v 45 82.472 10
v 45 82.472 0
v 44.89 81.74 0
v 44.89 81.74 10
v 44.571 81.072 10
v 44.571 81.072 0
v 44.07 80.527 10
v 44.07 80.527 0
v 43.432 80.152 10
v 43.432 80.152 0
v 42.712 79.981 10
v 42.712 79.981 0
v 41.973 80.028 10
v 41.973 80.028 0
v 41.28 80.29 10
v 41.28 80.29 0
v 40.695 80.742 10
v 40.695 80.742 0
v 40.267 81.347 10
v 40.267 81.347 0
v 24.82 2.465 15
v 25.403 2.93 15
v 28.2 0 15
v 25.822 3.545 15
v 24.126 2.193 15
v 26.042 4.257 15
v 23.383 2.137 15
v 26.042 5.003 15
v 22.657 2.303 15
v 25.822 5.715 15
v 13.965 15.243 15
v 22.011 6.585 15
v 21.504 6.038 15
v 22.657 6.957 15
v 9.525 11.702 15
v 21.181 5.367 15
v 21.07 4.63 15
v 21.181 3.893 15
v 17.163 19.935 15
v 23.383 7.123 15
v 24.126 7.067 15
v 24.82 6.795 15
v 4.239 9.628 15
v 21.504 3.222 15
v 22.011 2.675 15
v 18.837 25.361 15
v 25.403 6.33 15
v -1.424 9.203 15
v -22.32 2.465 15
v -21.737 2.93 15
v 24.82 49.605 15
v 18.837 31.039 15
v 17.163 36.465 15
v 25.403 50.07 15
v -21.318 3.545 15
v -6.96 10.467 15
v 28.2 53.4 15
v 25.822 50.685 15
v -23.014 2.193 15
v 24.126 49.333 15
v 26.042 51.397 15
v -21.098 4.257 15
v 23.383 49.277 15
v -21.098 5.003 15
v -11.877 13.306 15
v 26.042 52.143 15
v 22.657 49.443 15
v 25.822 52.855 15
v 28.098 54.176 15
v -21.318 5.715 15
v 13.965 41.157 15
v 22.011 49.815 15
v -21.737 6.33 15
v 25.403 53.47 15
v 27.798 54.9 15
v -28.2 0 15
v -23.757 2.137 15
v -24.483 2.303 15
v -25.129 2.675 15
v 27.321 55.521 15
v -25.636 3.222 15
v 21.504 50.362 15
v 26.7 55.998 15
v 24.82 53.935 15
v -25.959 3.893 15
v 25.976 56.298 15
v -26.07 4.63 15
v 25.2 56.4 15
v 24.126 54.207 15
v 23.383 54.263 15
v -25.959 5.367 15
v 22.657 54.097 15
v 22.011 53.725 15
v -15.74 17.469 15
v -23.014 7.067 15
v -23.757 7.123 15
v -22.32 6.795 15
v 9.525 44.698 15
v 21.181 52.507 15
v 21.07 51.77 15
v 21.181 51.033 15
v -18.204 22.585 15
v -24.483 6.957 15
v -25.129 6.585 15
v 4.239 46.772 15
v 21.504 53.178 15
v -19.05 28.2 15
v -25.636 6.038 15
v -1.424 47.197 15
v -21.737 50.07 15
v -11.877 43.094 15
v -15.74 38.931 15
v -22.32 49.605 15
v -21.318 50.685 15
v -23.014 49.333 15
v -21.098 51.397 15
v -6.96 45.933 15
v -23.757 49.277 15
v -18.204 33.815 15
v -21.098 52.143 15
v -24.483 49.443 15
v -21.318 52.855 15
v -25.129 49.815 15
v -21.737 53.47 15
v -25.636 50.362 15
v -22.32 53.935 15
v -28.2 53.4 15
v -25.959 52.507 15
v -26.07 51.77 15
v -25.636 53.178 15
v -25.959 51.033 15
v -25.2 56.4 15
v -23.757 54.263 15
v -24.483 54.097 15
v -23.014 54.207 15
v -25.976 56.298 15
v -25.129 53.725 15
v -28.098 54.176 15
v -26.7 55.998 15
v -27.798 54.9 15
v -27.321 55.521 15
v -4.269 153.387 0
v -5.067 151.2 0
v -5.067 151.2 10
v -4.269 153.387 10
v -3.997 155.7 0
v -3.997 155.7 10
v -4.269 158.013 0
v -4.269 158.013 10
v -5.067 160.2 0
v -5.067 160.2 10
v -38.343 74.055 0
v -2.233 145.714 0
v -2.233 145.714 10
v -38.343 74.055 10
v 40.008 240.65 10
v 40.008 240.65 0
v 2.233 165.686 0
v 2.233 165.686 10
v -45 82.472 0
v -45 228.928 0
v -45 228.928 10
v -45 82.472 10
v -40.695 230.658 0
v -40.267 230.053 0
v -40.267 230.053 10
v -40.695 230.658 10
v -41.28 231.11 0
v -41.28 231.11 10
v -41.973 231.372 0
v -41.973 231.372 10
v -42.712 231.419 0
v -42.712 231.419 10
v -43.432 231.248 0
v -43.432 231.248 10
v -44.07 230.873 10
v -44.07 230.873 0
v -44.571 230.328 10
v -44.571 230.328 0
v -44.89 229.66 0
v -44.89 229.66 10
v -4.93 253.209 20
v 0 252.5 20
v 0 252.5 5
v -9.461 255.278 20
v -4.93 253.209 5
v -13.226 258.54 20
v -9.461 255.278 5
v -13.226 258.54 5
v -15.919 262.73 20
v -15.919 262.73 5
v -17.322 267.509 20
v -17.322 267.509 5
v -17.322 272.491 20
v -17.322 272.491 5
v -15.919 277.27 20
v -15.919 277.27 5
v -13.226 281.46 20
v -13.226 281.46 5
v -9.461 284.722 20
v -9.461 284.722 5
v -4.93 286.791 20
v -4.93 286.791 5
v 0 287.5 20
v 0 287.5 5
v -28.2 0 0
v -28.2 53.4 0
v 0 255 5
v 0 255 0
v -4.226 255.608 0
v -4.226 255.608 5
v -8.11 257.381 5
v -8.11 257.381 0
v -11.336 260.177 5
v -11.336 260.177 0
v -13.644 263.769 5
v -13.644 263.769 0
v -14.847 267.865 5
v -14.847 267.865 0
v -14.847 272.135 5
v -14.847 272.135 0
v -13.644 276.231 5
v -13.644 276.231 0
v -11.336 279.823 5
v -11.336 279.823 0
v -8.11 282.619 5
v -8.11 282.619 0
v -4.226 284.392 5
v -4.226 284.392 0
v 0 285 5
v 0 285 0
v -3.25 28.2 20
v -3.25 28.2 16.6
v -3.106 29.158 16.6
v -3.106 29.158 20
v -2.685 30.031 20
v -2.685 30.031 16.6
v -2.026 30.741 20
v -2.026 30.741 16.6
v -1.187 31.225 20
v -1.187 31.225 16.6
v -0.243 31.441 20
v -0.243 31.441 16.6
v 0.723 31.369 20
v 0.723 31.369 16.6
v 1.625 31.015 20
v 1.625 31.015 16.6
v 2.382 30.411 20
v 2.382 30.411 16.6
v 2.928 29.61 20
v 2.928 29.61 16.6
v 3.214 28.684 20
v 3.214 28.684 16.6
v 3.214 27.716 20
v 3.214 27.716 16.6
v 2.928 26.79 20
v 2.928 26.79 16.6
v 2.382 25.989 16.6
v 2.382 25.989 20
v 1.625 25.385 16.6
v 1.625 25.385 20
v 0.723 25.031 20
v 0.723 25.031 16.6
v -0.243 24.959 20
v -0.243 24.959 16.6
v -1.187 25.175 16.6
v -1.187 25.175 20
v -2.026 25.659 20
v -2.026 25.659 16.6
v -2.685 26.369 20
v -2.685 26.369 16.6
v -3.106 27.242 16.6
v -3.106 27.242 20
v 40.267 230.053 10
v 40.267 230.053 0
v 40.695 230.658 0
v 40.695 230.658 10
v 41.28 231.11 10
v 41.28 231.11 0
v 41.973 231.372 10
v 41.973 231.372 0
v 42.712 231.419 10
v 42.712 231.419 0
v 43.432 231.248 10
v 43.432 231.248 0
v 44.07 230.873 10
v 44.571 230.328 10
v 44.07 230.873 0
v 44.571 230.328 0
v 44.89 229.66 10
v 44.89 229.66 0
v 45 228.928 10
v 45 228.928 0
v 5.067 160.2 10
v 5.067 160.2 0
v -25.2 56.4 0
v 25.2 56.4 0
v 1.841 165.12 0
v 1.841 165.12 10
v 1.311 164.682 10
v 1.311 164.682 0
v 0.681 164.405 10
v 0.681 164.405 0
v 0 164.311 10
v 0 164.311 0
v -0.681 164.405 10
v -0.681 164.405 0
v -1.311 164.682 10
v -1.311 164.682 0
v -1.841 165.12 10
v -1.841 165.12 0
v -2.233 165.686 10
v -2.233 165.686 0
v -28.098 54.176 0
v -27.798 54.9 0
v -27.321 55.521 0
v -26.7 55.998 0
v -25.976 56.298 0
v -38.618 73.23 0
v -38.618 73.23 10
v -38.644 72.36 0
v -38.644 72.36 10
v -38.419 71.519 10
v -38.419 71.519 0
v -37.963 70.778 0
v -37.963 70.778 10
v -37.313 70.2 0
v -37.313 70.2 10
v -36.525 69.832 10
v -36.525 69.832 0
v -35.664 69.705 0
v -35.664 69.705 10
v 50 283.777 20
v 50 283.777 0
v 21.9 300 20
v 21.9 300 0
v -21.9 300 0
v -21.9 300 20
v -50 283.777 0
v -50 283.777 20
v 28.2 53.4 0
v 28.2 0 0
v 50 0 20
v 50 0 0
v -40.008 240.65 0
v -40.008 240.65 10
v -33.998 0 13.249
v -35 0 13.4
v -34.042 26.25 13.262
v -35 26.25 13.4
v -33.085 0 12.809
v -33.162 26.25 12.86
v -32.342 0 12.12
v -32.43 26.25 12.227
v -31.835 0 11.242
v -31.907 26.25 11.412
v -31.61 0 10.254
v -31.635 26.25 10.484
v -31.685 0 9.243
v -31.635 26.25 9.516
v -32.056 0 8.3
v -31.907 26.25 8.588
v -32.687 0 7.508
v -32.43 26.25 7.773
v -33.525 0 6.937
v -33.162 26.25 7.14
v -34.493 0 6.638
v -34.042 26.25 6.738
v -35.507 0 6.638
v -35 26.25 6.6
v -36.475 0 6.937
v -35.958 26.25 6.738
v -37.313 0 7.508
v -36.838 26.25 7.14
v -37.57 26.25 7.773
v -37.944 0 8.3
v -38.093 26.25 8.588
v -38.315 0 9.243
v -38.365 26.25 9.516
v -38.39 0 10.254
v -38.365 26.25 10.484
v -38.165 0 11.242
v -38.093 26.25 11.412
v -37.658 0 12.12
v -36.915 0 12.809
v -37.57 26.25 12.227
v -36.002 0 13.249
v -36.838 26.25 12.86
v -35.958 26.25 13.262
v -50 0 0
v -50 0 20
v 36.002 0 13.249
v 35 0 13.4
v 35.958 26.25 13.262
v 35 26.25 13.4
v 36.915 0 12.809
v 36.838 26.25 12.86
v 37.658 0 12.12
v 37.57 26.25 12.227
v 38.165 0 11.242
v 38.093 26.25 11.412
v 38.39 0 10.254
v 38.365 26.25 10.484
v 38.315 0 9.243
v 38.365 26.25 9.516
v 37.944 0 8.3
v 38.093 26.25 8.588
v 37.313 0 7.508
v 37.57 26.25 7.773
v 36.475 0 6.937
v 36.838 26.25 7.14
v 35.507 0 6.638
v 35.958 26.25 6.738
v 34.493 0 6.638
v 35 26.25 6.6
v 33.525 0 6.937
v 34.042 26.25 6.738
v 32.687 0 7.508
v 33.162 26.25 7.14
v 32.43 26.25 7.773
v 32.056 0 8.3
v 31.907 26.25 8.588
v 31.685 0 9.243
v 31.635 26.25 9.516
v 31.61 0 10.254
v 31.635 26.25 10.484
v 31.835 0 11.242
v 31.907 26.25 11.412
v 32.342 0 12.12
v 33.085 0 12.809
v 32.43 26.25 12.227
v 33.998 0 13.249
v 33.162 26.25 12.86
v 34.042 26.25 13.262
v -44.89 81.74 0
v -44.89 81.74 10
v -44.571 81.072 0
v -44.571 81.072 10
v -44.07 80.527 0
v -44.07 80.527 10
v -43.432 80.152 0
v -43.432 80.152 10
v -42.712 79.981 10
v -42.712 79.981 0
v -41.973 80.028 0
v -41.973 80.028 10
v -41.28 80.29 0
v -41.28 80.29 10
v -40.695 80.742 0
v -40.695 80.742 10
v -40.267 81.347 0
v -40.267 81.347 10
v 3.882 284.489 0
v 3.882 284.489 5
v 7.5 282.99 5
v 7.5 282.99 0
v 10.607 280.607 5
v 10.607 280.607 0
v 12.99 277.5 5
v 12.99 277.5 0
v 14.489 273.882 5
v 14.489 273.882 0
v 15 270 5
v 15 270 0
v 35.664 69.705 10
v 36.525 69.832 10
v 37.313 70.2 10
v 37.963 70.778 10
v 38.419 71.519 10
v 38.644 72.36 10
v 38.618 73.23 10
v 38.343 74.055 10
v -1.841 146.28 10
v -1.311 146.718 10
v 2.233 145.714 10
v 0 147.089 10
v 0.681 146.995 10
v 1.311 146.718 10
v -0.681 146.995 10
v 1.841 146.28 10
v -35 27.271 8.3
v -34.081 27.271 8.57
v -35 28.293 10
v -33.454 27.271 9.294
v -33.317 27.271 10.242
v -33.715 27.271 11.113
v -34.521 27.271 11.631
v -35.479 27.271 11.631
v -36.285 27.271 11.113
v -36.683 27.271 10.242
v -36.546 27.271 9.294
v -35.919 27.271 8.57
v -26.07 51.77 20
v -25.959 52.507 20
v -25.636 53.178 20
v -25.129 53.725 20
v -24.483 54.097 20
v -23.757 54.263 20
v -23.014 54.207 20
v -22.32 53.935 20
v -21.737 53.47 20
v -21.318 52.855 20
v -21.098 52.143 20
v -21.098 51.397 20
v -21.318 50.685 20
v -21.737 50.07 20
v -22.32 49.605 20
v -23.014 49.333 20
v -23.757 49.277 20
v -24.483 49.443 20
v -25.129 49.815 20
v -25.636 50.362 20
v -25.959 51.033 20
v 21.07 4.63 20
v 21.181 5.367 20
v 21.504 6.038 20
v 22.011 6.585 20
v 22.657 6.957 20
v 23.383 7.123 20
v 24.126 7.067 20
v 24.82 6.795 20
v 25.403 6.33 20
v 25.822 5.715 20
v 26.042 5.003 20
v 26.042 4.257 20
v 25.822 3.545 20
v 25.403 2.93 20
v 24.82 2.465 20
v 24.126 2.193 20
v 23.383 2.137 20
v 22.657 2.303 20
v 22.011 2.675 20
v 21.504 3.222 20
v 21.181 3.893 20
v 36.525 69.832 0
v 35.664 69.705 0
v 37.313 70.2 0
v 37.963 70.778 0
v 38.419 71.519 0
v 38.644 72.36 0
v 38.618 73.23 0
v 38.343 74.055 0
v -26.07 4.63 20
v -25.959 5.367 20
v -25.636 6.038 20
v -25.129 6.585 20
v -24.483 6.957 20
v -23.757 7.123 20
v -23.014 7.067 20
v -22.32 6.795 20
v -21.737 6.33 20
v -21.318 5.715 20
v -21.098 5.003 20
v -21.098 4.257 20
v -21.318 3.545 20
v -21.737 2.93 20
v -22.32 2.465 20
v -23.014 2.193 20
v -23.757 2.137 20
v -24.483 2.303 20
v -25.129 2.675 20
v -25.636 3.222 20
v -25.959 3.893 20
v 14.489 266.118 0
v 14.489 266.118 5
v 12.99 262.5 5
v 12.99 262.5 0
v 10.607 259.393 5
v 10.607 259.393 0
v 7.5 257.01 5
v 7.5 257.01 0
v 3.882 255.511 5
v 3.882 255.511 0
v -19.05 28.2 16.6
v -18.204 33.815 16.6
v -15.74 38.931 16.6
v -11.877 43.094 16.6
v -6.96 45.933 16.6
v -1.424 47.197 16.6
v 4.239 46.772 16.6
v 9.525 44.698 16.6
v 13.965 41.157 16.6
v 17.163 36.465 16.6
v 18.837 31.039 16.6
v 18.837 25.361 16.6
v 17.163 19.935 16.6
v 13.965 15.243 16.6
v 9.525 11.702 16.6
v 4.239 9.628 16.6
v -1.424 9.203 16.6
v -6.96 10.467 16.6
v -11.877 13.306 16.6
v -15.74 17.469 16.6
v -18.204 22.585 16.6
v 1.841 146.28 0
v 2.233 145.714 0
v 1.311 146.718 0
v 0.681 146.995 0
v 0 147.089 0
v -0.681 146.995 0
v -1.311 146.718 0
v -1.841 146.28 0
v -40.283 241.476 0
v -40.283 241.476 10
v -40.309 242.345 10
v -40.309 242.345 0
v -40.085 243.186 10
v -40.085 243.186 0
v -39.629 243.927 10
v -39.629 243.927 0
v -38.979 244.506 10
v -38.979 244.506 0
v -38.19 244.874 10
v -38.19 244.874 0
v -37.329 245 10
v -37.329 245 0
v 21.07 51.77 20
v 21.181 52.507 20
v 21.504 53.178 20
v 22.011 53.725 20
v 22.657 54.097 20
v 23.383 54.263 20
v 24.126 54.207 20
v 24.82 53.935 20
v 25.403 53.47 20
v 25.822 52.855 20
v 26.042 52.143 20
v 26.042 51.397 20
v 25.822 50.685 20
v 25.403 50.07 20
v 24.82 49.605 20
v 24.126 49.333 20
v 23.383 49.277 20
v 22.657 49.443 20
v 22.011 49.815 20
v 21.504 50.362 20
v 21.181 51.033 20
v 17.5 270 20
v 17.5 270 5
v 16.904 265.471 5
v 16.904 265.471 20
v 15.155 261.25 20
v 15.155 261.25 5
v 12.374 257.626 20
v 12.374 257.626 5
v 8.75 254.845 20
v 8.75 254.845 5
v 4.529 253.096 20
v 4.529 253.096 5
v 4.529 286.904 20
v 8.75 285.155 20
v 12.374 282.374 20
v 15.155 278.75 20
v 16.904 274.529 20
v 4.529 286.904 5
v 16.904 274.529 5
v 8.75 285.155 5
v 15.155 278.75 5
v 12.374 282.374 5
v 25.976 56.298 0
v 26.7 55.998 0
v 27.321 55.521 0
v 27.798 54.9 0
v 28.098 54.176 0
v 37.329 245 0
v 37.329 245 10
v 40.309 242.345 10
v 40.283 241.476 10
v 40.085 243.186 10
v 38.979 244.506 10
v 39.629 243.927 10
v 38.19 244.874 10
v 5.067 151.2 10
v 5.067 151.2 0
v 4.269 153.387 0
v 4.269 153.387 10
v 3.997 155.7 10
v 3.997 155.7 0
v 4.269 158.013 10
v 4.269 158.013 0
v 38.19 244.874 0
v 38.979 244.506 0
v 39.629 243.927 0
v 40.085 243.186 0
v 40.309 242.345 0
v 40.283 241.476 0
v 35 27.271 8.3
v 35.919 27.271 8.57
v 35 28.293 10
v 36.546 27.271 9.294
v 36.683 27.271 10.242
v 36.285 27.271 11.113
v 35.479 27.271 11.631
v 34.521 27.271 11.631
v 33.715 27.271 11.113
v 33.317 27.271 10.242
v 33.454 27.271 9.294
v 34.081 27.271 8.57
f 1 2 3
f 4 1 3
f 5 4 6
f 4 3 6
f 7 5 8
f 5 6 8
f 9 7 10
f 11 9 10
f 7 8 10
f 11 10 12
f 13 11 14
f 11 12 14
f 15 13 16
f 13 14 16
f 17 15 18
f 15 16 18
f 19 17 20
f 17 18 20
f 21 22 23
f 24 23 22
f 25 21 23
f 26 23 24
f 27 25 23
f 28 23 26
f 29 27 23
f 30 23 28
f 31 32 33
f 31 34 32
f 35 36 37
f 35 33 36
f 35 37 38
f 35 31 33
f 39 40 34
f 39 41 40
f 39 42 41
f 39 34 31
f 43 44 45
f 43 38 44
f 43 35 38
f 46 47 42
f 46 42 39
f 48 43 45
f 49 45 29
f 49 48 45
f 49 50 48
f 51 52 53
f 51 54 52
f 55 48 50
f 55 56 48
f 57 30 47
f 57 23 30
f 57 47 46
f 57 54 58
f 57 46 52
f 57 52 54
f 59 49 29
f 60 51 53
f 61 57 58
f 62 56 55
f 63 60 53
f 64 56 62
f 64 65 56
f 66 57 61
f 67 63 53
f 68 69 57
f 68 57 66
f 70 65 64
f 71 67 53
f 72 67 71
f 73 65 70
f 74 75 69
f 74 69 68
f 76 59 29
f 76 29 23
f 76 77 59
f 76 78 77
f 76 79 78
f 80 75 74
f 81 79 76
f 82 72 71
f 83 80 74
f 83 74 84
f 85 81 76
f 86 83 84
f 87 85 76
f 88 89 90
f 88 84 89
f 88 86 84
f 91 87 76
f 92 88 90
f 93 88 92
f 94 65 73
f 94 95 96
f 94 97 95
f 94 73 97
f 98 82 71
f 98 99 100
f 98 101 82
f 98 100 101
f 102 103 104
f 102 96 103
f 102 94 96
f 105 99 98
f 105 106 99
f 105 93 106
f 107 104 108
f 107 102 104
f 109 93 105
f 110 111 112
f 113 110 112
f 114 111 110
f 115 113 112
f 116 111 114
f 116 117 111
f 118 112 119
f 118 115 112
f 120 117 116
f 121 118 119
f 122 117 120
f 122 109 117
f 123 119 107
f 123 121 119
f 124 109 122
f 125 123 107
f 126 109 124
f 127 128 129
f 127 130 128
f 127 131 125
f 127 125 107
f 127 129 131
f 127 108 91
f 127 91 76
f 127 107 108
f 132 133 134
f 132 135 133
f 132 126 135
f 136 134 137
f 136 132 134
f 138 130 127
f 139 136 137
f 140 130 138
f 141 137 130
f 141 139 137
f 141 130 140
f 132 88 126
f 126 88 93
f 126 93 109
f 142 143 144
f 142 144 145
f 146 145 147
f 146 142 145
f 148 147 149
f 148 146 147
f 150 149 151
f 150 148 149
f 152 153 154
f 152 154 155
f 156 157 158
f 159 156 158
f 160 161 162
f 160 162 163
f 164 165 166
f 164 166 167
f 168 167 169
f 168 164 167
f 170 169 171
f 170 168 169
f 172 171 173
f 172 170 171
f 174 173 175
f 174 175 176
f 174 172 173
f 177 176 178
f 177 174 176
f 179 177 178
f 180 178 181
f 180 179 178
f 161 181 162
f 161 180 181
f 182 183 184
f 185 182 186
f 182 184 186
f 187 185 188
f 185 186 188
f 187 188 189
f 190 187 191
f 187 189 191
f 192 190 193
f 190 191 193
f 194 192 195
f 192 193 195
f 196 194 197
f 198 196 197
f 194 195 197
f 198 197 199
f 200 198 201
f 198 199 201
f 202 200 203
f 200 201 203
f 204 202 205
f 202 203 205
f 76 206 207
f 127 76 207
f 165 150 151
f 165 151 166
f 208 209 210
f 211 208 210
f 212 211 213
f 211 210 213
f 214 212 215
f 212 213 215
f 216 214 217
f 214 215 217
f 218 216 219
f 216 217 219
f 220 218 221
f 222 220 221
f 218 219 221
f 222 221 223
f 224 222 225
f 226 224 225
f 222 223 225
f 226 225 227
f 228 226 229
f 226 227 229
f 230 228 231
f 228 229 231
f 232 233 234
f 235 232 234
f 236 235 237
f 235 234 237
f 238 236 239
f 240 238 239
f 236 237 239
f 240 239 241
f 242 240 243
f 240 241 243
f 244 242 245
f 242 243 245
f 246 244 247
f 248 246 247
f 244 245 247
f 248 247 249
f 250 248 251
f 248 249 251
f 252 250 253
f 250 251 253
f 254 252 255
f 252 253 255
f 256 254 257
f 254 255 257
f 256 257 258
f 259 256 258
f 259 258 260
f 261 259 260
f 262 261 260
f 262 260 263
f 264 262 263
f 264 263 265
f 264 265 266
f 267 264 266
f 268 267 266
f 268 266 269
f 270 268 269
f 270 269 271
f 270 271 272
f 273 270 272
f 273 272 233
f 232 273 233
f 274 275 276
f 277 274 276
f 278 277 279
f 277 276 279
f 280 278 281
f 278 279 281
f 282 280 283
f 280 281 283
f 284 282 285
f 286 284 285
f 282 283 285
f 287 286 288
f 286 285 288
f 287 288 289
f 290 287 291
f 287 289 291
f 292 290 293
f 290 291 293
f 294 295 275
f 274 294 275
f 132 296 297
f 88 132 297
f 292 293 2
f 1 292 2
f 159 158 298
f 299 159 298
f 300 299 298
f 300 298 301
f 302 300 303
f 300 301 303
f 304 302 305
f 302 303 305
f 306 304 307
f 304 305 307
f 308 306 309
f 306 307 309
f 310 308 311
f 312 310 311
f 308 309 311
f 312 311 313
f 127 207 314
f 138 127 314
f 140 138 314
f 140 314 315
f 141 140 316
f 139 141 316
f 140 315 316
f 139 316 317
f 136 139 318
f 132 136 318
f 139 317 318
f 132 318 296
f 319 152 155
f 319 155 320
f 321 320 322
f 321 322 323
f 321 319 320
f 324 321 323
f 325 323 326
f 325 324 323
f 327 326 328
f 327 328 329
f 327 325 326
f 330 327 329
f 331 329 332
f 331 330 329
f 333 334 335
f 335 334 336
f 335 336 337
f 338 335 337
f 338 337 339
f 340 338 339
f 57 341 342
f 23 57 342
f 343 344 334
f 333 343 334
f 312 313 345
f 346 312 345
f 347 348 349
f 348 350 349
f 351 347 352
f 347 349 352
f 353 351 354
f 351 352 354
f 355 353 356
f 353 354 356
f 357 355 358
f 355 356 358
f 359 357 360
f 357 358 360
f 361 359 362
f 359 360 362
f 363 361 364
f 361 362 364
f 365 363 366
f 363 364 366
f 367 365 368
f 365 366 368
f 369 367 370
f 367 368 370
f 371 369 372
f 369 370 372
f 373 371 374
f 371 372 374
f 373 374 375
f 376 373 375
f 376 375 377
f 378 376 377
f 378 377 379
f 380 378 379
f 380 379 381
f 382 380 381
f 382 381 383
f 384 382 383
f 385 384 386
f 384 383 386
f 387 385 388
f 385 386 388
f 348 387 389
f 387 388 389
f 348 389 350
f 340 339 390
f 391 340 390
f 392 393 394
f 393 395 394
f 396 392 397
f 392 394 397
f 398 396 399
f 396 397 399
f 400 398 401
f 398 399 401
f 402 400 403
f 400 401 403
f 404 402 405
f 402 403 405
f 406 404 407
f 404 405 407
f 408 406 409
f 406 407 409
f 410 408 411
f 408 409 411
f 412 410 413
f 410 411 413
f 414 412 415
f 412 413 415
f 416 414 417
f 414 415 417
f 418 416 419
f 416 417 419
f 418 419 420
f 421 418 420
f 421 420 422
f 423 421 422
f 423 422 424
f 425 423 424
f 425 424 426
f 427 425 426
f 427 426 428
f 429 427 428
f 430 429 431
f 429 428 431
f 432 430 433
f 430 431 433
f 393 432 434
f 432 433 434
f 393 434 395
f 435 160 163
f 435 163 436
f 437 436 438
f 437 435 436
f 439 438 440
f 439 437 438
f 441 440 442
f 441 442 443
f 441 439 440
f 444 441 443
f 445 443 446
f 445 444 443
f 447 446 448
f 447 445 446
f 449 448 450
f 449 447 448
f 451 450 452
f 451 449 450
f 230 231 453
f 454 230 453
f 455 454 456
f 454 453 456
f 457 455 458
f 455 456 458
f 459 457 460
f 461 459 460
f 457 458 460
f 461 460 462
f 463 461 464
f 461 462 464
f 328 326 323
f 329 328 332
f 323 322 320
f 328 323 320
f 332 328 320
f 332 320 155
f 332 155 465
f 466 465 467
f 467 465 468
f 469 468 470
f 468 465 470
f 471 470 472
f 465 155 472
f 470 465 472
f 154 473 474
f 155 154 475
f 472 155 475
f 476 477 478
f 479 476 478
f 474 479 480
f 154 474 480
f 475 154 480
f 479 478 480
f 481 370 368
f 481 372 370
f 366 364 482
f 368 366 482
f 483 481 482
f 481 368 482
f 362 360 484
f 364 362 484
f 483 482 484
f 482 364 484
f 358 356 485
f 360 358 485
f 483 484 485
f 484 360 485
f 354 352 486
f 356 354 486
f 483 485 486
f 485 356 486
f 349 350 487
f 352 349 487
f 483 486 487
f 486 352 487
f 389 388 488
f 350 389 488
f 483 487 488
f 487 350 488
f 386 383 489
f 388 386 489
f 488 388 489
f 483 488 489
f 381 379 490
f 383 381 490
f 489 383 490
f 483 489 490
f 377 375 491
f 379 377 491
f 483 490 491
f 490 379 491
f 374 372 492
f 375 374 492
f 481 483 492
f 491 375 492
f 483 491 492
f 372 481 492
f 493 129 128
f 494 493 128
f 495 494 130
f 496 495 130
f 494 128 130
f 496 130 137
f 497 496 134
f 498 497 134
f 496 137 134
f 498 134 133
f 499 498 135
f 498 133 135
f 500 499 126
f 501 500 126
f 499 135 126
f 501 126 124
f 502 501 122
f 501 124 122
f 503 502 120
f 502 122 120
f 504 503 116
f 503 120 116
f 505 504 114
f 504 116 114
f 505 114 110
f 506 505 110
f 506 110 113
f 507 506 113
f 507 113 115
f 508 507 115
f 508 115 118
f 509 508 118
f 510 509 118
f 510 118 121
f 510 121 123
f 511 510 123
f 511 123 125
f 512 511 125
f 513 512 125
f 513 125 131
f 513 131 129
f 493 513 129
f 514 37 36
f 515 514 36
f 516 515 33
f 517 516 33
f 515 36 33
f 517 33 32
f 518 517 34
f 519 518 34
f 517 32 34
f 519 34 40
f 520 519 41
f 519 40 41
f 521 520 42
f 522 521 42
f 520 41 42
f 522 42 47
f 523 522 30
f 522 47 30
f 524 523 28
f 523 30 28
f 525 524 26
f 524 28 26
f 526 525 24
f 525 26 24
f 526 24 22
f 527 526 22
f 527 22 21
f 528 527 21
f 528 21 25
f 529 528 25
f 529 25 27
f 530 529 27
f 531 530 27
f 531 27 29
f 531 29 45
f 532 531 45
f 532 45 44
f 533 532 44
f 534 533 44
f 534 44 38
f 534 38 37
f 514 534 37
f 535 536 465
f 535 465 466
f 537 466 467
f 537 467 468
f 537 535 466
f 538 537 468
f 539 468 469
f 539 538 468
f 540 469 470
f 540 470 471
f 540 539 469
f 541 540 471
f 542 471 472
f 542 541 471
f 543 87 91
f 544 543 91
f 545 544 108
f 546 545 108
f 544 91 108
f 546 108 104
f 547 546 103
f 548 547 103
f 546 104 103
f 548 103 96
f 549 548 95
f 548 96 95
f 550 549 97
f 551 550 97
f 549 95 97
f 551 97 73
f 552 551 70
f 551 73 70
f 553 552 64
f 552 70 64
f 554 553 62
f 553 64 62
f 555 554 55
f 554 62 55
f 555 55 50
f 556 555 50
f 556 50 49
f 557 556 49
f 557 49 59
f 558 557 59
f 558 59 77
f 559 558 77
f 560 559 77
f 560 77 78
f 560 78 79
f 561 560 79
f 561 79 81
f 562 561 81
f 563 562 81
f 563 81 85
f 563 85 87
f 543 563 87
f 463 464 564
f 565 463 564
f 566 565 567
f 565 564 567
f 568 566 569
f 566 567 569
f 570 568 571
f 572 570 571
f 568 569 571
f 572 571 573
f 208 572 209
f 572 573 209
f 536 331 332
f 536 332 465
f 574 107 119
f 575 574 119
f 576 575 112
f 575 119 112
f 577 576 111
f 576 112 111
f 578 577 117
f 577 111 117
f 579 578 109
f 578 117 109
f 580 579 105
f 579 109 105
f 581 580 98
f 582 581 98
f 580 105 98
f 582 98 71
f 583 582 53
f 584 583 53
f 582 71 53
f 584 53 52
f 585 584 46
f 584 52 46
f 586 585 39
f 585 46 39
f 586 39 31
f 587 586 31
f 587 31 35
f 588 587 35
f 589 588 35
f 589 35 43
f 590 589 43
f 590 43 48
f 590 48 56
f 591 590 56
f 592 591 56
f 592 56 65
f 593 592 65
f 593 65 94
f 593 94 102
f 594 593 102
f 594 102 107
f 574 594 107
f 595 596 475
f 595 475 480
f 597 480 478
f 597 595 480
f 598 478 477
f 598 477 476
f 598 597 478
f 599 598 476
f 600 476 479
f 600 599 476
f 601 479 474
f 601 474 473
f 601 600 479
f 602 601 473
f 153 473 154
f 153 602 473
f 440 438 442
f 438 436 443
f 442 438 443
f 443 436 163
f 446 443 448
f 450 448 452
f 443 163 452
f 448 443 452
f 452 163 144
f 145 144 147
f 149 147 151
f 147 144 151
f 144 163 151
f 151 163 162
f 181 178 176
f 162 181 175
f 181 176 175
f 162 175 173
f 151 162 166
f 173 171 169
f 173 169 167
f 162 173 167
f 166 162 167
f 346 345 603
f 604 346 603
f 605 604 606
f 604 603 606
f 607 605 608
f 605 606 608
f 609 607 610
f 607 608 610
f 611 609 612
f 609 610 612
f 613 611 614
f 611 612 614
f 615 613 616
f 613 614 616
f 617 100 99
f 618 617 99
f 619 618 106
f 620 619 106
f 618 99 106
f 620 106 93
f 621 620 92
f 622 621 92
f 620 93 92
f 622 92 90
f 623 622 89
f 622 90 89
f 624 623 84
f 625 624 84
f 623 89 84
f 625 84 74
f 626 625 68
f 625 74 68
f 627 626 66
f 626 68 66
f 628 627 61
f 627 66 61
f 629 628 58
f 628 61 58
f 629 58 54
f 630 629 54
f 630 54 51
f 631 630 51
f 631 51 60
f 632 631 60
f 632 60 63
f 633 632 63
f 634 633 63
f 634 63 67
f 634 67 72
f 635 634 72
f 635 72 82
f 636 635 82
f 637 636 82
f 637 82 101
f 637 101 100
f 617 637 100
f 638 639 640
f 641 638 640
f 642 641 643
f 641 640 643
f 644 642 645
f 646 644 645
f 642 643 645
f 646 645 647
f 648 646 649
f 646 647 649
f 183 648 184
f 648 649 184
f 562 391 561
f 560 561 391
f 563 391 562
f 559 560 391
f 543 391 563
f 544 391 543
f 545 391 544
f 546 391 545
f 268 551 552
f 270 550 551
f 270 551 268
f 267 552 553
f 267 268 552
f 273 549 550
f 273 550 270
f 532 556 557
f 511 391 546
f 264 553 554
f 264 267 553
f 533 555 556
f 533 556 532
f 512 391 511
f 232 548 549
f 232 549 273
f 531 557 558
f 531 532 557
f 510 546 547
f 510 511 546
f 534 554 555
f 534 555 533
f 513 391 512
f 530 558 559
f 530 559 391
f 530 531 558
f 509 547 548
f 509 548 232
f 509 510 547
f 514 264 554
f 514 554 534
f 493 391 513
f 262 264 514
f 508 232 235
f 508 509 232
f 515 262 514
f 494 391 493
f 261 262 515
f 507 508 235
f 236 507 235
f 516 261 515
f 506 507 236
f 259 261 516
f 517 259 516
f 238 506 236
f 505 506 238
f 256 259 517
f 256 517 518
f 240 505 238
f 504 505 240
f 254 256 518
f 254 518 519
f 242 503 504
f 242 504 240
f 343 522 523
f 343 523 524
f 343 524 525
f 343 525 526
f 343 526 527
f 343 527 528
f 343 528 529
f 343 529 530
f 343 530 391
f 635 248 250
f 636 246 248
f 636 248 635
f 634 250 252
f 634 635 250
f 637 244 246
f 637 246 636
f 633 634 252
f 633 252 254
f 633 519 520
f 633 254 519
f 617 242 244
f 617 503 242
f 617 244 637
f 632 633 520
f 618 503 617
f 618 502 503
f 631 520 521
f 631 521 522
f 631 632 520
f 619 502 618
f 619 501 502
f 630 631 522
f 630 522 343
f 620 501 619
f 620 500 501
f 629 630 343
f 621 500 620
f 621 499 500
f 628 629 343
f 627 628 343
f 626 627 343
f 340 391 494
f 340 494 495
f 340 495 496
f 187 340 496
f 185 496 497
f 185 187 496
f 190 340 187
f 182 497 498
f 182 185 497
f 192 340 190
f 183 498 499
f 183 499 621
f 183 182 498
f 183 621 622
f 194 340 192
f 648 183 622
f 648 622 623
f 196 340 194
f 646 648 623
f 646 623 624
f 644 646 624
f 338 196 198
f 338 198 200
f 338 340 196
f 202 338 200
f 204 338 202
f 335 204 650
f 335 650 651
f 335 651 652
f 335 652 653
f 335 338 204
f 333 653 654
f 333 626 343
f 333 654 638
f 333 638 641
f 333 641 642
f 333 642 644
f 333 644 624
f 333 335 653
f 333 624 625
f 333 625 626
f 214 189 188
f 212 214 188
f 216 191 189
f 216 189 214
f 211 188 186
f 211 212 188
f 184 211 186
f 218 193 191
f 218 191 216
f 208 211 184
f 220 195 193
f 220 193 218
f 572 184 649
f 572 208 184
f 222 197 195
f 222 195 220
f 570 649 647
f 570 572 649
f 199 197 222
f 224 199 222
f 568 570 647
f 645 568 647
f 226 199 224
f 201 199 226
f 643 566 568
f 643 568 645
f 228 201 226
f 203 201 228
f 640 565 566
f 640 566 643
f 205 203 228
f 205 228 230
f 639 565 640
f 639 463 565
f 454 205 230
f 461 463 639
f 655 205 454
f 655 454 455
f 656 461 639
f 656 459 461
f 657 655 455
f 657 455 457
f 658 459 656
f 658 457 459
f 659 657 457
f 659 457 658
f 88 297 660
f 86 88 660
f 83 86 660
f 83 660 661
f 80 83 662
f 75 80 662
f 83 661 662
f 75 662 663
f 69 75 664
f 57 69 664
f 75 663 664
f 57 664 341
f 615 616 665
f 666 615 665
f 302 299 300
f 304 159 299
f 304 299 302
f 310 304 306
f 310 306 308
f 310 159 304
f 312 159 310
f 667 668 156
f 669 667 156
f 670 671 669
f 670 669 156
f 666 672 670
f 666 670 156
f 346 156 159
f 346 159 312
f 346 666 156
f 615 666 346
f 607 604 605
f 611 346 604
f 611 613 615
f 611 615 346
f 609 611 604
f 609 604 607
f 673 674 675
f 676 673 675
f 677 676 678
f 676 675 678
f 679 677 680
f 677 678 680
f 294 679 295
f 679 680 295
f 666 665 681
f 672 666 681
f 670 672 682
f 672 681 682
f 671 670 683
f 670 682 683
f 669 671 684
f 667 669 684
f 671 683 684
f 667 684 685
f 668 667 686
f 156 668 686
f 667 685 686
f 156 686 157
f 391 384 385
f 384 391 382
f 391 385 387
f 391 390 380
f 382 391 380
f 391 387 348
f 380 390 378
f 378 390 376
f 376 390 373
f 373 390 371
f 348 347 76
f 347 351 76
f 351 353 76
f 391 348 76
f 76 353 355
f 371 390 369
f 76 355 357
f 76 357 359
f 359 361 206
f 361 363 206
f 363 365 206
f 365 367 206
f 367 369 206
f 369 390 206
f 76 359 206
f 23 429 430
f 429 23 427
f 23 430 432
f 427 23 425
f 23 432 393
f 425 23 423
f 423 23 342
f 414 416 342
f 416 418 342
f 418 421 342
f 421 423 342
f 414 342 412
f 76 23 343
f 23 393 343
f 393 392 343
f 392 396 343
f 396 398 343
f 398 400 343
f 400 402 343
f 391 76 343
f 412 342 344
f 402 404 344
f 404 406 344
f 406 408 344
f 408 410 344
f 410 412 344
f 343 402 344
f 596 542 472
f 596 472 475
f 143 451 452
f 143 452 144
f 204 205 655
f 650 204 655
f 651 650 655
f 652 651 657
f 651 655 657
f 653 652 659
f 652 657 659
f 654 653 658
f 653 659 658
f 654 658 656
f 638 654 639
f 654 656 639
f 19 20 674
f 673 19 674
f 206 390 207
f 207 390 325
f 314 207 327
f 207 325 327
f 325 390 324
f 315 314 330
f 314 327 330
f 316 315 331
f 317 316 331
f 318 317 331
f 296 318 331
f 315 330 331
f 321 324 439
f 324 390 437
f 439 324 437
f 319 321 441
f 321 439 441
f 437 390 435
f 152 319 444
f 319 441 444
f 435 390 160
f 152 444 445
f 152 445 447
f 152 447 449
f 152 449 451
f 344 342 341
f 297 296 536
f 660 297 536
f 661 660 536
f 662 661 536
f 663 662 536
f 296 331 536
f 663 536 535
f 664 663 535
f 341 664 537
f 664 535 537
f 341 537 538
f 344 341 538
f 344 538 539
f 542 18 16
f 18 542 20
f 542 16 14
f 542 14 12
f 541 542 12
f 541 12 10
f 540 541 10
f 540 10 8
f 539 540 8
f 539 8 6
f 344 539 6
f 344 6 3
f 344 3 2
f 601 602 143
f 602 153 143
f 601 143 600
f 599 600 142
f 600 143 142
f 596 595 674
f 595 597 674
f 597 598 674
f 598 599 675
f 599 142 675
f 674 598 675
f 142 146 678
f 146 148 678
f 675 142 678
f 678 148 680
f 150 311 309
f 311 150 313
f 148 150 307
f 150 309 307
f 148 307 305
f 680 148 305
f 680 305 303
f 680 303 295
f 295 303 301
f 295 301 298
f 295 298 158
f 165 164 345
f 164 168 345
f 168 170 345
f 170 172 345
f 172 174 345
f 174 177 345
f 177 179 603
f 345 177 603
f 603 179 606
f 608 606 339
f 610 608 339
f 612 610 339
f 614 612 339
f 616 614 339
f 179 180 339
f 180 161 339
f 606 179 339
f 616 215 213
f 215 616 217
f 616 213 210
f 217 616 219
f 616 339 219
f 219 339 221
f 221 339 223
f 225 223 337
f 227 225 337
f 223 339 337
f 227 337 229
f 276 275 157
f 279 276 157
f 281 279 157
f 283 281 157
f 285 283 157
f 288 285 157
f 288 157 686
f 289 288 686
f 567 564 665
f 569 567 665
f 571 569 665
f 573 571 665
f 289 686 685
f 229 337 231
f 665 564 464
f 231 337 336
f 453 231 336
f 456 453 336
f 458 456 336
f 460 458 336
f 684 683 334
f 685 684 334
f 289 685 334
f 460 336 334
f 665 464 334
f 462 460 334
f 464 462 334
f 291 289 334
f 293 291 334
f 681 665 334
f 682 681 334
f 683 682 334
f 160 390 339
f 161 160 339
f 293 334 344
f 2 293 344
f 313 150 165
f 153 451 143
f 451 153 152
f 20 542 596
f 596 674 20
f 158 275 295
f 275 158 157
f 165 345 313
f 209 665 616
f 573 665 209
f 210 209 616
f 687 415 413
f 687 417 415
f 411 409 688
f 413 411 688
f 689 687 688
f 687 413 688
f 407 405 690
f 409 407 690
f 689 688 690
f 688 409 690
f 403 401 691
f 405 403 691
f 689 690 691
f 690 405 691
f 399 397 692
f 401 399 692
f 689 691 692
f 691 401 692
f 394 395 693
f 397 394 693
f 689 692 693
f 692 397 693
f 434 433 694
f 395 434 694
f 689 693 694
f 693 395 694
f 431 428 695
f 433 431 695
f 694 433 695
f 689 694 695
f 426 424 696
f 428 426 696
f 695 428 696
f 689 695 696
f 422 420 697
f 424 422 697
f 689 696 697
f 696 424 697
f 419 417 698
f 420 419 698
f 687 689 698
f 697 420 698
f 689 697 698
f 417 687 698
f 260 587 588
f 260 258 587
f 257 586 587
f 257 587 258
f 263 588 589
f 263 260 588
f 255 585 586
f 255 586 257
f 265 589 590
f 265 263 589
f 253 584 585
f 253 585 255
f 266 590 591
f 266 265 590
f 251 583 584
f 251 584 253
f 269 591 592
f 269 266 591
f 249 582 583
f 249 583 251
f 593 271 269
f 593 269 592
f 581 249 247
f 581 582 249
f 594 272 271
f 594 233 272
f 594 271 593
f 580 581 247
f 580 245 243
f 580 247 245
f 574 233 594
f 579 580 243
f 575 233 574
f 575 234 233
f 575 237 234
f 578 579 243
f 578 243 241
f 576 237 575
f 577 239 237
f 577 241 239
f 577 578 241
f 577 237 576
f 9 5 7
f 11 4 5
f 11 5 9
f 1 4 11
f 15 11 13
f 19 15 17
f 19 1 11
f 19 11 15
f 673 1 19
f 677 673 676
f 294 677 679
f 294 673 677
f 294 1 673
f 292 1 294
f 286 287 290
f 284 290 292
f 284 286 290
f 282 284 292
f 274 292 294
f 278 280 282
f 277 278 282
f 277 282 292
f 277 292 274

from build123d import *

# Parameters (mm, degrees)
SZKIC1_R                    = 17.5
DODANIE_WYCI_GNI_CIE1_DEPTH = 20
SZKIC1_3_R                  = 17.5
SZKIC1_3_R_2                = 15
DODANIE_WYCI_GNI_CIE2_DEPTH = 5
OTW_R_GWINTOWANY_M81_D      = 6.8
OTW_R_GWINTOWANY_M81_DEPTH  = 26.25
OTW_R_GWINTOWANY_M81_TIP    = 2.042926105
SZKIC4_R                    = 3.25
WYTNIJ_WYCI_GNI_CIE2_DEPTH  = 15
SZKIC4_4_R                  = 19.05
SZKIC4_4_R_2                = 3.25
WYTNIJ_WYCI_GNI_CIE3_DEPTH  = 16.6
SZKIC4_5_R                  = 3.25
WYTNIJ_WYCI_GNI_CIE4_DEPTH  = 49.6
SZKIC5_R                    = 2.5
WYTNIJ_WYCI_GNI_CIE5_DEPTH  = 7.6
WYTNIJ_WYCI_GNI_CIE6_DEPTH  = 10


with BuildPart() as part:
    # Szkic1 → Dodanie-wyciągnięcie1 (new body)
    with BuildSketch(Plane.XY):
        Polygon((-50, 0), (50, 0), (50, 283.776622614), (21.900286098, 300), (-21.900286098, 300), (-50, 283.776622614), align=None)
        with Locations((0, 270)):
            Circle(SZKIC1_R, mode=Mode.SUBTRACT)
    extrude(amount=DODANIE_WYCI_GNI_CIE1_DEPTH)

    # Szkic1<3> → Dodanie-wyciągnięcie2 (add)
    with BuildSketch(Plane.XY):
        with Locations((0, 270)):
            Circle(SZKIC1_3_R)
        with Locations((0, 270)):
            Circle(SZKIC1_3_R_2, mode=Mode.SUBTRACT)
    extrude(amount=DODANIE_WYCI_GNI_CIE2_DEPTH)

    # Otwór gwintowany M81
    with Locations(Plane(origin=(-35, 0, 10), x_dir=(0, 0, -1), z_dir=(0, -1, 0))):
        with Locations((0, 0), (0, 70)):
            Hole(OTW_R_GWINTOWANY_M81_D / 2, depth=OTW_R_GWINTOWANY_M81_DEPTH)
            with Locations((0, 0, -(OTW_R_GWINTOWANY_M81_DEPTH + OTW_R_GWINTOWANY_M81_TIP / 2))):  # 118° drill point
                Cone(0, OTW_R_GWINTOWANY_M81_D / 2, OTW_R_GWINTOWANY_M81_TIP, mode=Mode.SUBTRACT)

    # Szkic4 → Wytnij-wyciągnięcie2 (cut)
    with BuildSketch(Plane(origin=(0, 0, 0), x_dir=(-1, 0, 0), z_dir=(0, 0, -1))):
        with BuildLine():
            Line((-28.2, 53.4), (-28.2, 0))
            Line((-28.2, 0), (28.2, 0))
            Line((28.2, 0), (28.2, 53.4))
            ThreePointArc((28.2, 53.4), (27.321320344, 55.521320344), (25.2, 56.4))
            Line((25.2, 56.4), (-25.2, 56.4))
            ThreePointArc((-25.2, 56.4), (-27.321320344, 55.521320344), (-28.2, 53.4))
        make_face()
        with Locations((0, 28.2)):
            Circle(SZKIC4_R, mode=Mode.SUBTRACT)
    extrude(amount=-WYTNIJ_WYCI_GNI_CIE2_DEPTH, mode=Mode.SUBTRACT)

    # Szkic4<4> → Wytnij-wyciągnięcie3 (cut)
    with BuildSketch(Plane(origin=(0, 0, 0), x_dir=(-1, 0, 0), z_dir=(0, 0, -1))):
        with Locations((0, 28.2)):
            Circle(SZKIC4_4_R)
        with Locations((0, 28.2)):
            Circle(SZKIC4_4_R_2, mode=Mode.SUBTRACT)
    extrude(amount=-WYTNIJ_WYCI_GNI_CIE3_DEPTH, mode=Mode.SUBTRACT)

    # Szkic4<5> → Wytnij-wyciągnięcie4 (cut)
    with BuildSketch(Plane(origin=(0, 0, 0), x_dir=(-1, 0, 0), z_dir=(0, 0, -1))):
        with Locations((0, 28.2)):
            Circle(SZKIC4_5_R)
    extrude(amount=-WYTNIJ_WYCI_GNI_CIE4_DEPTH, mode=Mode.SUBTRACT)

    # Szkic5 → Wytnij-wyciągnięcie5 (cut)
    with BuildSketch(Plane(origin=(0, 0, 15), x_dir=(-1, 0, 0), z_dir=(0, 0, -1))):
        with Locations((-23.57, 51.77)):
            Circle(SZKIC5_R)
        with Locations((23.57, 51.77)):
            Circle(SZKIC5_R)
        with Locations((23.57, 4.63)):
            Circle(SZKIC5_R)
        with Locations((-23.57, 4.63)):
            Circle(SZKIC5_R)
    extrude(amount=-WYTNIJ_WYCI_GNI_CIE5_DEPTH, mode=Mode.SUBTRACT)

    # Szkic6 → Wytnij-wyciągnięcie6 (cut)
    with BuildSketch(Plane(origin=(0, 0, 0), x_dir=(-1, 0, 0), z_dir=(0, 0, -1))):
        with BuildLine():
            Line((-45, 228.928061115), (-45, 82.471938885))
            ThreePointArc((-45, 82.471938885), (-43.078190139, 80.039718467), (-40.267443069, 81.346910197))
            Line((-40.267443069, 81.346910197), (-5.067175687, 151.199885246))
            ThreePointArc((-5.067175687, 151.199885246), (-3.997403411, 155.7), (-5.067175687, 160.200114754))
            Line((-5.067175687, 160.200114754), (-40.267443069, 230.053089803))
            ThreePointArc((-40.267443069, 230.053089803), (-43.078190139, 231.360281533), (-45, 228.928061115))
        make_face()
        with BuildLine():
            Line((2.232556931, 145.714200914), (38.342819518, 74.055390936))
            ThreePointArc((38.342819518, 74.055390936), (38.218169264, 71.13215965), (35.663751201, 69.70535651))
            Line((35.663751201, 69.70535651), (-35.663751201, 69.70535651))
            ThreePointArc((-35.663751201, 69.70535651), (-38.218169264, 71.13215965), (-38.342819518, 74.055390936))
            Line((-38.342819518, 74.055390936), (-2.232556931, 145.714200914))
            ThreePointArc((-2.232556931, 145.714200914), (0, 147.089172226), (2.232556931, 145.714200914))
        make_face()
        with BuildLine():
            Line((45, 228.928061115), (45, 82.471938885))
            ThreePointArc((45, 82.471938885), (43.078190139, 80.039718467), (40.267443069, 81.346910197))
            Line((40.267443069, 81.346910197), (5.067175687, 151.199885246))
            ThreePointArc((5.067175687, 151.199885246), (3.997403411, 155.7), (5.067175687, 160.200114754))
            Line((5.067175687, 160.200114754), (40.267443069, 230.053089803))
            ThreePointArc((40.267443069, 230.053089803), (43.078190139, 231.360281533), (45, 228.928061115))
        make_face()
        with BuildLine():
            Line((-40.008452698, 240.649965574), (-2.232556931, 165.685799086))
            ThreePointArc((-2.232556931, 165.685799086), (0, 164.310827774), (2.232556931, 165.685799086))
            Line((2.232556931, 165.685799086), (40.008452698, 240.649965574))
            ThreePointArc((40.008452698, 240.649965574), (39.883802443, 243.57319686), (37.329384381, 245))
            Line((37.329384381, 245), (-37.32938438, 245))
            ThreePointArc((-37.32938438, 245), (-39.883802443, 243.57319686), (-40.008452698, 240.649965574))
        make_face()
    extrude(amount=-WYTNIJ_WYCI_GNI_CIE6_DEPTH, mode=Mode.SUBTRACT)


solid = part.part
